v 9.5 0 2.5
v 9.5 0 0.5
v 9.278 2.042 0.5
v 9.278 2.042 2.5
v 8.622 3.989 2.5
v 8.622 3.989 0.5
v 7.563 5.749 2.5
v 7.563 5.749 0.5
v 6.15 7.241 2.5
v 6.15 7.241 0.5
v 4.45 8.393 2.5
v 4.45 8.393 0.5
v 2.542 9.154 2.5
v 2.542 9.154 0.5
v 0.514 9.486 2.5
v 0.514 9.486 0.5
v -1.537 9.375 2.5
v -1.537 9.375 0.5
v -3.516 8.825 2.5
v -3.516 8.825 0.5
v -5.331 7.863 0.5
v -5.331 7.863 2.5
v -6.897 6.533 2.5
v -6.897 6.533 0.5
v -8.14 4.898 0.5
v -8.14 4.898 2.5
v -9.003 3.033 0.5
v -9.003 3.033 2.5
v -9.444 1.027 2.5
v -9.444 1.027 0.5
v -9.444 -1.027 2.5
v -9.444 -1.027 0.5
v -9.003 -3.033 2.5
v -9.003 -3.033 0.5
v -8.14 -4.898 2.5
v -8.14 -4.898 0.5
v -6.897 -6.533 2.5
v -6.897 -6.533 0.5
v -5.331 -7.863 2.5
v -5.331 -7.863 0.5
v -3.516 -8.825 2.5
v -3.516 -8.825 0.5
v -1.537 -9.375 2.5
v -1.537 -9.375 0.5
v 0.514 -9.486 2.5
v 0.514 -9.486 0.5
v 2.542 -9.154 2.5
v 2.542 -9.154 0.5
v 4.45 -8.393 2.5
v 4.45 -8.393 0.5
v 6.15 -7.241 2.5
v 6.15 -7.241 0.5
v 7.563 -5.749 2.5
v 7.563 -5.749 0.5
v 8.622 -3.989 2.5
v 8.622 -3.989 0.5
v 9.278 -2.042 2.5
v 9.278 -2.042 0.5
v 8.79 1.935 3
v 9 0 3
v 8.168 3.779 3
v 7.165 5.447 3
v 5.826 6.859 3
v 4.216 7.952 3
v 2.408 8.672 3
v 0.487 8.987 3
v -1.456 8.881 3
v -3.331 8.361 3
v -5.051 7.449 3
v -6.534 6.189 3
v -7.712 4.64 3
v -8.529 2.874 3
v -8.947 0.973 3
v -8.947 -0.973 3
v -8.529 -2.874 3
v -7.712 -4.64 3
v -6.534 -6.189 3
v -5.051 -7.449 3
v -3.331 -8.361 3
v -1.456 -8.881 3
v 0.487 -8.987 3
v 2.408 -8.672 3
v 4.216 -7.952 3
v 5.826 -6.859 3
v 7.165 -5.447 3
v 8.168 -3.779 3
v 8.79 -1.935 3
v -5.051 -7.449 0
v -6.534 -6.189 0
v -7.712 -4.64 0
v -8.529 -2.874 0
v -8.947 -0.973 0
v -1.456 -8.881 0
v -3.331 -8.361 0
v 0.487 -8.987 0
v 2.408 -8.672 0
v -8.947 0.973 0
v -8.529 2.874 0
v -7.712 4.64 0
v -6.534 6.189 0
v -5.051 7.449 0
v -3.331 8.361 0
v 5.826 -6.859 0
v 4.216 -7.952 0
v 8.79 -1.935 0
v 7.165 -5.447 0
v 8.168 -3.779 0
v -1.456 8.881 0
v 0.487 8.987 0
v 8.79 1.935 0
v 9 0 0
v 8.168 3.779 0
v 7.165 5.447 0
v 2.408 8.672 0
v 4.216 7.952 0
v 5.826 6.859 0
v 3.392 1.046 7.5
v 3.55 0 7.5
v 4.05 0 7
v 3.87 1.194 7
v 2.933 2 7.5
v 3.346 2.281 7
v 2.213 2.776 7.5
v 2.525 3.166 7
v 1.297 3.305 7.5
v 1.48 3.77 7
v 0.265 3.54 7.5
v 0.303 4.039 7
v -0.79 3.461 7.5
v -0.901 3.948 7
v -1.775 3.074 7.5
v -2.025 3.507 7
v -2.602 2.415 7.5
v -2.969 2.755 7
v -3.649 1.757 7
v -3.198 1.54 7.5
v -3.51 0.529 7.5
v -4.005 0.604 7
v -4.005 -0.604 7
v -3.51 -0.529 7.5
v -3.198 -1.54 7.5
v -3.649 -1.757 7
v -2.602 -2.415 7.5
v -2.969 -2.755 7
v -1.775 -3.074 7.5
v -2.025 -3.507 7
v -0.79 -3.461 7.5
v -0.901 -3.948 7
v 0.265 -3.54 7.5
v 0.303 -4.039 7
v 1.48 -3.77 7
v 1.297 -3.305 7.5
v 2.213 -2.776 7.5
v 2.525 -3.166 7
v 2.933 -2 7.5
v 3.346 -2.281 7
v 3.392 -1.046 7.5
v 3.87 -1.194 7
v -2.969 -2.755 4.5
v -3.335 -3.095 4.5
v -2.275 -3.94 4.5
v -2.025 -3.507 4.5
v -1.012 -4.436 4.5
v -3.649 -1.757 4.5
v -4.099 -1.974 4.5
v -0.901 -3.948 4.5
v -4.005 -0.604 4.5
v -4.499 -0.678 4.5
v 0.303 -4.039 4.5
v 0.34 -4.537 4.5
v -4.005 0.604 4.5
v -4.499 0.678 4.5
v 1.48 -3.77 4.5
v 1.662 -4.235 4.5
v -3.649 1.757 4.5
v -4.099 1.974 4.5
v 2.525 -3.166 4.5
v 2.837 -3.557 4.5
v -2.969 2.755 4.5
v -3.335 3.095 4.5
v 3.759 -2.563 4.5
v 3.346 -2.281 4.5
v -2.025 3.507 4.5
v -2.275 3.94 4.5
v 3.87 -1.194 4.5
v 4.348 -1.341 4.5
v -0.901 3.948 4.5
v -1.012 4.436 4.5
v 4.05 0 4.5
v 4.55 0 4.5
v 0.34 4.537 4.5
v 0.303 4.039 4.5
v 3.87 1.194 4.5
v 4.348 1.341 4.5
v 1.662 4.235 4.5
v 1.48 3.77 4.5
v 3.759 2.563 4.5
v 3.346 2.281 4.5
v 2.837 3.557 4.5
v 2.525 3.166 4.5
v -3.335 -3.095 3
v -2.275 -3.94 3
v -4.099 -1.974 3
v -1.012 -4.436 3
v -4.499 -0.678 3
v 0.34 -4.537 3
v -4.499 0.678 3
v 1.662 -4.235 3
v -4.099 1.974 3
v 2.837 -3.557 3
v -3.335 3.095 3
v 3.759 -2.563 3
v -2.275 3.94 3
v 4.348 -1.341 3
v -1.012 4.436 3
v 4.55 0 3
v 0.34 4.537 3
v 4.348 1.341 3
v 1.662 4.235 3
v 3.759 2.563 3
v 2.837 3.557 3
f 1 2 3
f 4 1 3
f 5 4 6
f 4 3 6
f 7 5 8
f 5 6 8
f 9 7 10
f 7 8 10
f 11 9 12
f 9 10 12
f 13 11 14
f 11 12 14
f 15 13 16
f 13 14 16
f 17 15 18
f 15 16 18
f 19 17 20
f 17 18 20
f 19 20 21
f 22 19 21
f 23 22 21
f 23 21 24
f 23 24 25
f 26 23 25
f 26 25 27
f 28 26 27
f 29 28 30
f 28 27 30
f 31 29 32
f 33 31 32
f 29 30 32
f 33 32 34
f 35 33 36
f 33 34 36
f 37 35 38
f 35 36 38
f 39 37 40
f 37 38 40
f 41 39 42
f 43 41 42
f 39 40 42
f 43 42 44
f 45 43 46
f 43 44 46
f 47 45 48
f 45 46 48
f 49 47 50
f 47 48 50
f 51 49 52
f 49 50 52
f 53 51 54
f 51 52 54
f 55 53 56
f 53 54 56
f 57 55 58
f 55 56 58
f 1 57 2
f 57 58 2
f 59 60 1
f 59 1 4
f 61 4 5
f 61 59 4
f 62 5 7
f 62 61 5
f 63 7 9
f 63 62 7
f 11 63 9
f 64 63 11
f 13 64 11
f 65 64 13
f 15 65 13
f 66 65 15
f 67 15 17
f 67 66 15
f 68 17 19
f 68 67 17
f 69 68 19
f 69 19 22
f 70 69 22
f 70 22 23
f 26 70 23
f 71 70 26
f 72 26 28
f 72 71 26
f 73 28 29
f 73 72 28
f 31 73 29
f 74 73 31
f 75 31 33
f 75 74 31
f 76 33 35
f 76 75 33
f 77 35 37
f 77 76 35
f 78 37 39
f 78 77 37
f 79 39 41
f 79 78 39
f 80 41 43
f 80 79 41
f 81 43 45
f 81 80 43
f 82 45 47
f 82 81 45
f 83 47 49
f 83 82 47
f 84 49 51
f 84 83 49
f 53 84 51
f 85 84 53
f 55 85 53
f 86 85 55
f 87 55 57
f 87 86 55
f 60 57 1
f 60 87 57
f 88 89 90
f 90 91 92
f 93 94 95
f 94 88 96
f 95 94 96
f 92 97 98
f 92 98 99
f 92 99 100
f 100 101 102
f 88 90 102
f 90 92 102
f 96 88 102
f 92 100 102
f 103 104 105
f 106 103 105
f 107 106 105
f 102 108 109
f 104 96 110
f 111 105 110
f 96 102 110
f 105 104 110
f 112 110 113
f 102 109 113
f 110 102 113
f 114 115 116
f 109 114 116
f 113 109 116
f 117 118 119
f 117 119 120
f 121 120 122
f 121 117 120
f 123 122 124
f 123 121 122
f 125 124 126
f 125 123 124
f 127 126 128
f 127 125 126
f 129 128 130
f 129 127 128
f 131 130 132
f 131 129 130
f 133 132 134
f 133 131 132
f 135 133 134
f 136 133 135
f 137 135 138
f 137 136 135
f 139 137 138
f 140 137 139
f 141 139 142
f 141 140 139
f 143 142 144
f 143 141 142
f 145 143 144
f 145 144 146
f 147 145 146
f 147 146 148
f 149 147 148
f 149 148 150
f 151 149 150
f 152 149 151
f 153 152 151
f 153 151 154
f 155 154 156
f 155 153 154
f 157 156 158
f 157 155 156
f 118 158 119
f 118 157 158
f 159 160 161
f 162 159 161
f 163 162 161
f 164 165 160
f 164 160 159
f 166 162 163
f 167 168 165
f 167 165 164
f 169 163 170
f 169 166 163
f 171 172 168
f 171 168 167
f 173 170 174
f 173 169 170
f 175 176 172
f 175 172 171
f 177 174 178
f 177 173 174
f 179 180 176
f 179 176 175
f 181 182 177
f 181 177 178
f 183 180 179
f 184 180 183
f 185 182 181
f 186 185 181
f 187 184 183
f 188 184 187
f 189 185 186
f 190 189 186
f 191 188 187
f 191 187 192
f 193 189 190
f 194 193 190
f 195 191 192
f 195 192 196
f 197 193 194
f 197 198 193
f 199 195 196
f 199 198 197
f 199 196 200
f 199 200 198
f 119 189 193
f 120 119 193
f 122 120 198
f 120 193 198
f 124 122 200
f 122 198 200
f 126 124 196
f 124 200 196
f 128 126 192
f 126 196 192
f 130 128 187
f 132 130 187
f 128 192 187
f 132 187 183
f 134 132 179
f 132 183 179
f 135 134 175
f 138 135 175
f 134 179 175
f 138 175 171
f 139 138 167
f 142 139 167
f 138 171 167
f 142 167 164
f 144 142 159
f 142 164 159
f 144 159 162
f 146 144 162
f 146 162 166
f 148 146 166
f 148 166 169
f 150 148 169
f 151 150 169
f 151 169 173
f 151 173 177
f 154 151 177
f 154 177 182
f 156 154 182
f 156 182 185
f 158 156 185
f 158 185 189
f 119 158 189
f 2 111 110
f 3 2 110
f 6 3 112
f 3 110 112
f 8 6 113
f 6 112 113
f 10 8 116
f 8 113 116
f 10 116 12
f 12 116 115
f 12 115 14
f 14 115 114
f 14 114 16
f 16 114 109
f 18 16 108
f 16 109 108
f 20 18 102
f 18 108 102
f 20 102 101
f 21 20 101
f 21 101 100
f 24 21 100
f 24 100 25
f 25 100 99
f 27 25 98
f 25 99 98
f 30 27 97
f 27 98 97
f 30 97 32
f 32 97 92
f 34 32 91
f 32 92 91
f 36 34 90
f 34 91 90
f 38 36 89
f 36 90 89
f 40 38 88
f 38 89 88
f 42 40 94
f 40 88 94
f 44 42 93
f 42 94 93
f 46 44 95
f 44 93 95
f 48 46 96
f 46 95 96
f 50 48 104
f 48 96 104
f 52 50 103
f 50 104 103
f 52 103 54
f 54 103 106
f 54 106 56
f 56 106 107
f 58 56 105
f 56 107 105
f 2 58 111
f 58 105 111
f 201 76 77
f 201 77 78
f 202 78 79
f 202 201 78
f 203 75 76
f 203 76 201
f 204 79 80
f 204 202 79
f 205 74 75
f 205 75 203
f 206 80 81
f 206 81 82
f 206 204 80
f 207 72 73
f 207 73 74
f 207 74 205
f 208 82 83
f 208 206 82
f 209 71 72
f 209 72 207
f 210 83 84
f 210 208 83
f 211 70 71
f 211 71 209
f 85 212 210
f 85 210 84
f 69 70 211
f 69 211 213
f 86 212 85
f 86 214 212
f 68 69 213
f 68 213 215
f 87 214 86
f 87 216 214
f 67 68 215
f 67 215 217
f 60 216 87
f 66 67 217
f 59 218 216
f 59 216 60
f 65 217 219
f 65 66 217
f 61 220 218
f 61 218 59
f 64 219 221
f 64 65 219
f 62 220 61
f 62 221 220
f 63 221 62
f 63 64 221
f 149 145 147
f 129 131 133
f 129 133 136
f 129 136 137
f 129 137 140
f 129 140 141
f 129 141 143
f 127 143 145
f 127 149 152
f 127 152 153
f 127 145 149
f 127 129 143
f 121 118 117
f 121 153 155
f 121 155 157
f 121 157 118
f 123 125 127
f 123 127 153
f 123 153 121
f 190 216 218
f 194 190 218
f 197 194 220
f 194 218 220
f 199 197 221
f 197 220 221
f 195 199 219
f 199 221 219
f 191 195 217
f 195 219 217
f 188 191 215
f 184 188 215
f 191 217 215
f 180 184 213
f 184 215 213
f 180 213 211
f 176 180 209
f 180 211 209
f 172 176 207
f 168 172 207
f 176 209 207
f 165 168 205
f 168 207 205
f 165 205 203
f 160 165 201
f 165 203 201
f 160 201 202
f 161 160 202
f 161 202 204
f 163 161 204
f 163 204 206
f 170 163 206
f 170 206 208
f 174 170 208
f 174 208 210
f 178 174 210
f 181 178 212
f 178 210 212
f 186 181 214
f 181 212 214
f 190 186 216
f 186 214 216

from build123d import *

# Parameters (mm, degrees)
F0_R     = 9.5
F1_DEPTH = 3
F2_R     = 4.05
F3_DEPTH = 4.5
F4_SIZE  = 0.5
F5_R     = 4.55
F6_DEPTH = 1.5


with BuildPart() as f1:
    # F0 (on Top) → F1 (new body)
    with BuildSketch(Plane.XY):
        Circle(F0_R)
    extrude(amount=F1_DEPTH)

    # F2 (on face) → F3 (join)
    with BuildSketch(Plane.XY.offset(3)):
        Circle(F2_R)
    extrude(amount=F3_DEPTH)

    # F4
    f4_edges = [f1.edges().sort_by_distance(p)[0] for p in [
        (-4.05, 0, 7.5),
        (-9.5, 0, 3),
        (-9.5, 0, 0),
    ]]
    chamfer(f4_edges, length=F4_SIZE)

    # F5 (on face) → F6 (join)
    with BuildSketch(Plane.XY.offset(3)):
        Circle(F5_R)
    extrude(amount=F6_DEPTH)


solid = f1.part
